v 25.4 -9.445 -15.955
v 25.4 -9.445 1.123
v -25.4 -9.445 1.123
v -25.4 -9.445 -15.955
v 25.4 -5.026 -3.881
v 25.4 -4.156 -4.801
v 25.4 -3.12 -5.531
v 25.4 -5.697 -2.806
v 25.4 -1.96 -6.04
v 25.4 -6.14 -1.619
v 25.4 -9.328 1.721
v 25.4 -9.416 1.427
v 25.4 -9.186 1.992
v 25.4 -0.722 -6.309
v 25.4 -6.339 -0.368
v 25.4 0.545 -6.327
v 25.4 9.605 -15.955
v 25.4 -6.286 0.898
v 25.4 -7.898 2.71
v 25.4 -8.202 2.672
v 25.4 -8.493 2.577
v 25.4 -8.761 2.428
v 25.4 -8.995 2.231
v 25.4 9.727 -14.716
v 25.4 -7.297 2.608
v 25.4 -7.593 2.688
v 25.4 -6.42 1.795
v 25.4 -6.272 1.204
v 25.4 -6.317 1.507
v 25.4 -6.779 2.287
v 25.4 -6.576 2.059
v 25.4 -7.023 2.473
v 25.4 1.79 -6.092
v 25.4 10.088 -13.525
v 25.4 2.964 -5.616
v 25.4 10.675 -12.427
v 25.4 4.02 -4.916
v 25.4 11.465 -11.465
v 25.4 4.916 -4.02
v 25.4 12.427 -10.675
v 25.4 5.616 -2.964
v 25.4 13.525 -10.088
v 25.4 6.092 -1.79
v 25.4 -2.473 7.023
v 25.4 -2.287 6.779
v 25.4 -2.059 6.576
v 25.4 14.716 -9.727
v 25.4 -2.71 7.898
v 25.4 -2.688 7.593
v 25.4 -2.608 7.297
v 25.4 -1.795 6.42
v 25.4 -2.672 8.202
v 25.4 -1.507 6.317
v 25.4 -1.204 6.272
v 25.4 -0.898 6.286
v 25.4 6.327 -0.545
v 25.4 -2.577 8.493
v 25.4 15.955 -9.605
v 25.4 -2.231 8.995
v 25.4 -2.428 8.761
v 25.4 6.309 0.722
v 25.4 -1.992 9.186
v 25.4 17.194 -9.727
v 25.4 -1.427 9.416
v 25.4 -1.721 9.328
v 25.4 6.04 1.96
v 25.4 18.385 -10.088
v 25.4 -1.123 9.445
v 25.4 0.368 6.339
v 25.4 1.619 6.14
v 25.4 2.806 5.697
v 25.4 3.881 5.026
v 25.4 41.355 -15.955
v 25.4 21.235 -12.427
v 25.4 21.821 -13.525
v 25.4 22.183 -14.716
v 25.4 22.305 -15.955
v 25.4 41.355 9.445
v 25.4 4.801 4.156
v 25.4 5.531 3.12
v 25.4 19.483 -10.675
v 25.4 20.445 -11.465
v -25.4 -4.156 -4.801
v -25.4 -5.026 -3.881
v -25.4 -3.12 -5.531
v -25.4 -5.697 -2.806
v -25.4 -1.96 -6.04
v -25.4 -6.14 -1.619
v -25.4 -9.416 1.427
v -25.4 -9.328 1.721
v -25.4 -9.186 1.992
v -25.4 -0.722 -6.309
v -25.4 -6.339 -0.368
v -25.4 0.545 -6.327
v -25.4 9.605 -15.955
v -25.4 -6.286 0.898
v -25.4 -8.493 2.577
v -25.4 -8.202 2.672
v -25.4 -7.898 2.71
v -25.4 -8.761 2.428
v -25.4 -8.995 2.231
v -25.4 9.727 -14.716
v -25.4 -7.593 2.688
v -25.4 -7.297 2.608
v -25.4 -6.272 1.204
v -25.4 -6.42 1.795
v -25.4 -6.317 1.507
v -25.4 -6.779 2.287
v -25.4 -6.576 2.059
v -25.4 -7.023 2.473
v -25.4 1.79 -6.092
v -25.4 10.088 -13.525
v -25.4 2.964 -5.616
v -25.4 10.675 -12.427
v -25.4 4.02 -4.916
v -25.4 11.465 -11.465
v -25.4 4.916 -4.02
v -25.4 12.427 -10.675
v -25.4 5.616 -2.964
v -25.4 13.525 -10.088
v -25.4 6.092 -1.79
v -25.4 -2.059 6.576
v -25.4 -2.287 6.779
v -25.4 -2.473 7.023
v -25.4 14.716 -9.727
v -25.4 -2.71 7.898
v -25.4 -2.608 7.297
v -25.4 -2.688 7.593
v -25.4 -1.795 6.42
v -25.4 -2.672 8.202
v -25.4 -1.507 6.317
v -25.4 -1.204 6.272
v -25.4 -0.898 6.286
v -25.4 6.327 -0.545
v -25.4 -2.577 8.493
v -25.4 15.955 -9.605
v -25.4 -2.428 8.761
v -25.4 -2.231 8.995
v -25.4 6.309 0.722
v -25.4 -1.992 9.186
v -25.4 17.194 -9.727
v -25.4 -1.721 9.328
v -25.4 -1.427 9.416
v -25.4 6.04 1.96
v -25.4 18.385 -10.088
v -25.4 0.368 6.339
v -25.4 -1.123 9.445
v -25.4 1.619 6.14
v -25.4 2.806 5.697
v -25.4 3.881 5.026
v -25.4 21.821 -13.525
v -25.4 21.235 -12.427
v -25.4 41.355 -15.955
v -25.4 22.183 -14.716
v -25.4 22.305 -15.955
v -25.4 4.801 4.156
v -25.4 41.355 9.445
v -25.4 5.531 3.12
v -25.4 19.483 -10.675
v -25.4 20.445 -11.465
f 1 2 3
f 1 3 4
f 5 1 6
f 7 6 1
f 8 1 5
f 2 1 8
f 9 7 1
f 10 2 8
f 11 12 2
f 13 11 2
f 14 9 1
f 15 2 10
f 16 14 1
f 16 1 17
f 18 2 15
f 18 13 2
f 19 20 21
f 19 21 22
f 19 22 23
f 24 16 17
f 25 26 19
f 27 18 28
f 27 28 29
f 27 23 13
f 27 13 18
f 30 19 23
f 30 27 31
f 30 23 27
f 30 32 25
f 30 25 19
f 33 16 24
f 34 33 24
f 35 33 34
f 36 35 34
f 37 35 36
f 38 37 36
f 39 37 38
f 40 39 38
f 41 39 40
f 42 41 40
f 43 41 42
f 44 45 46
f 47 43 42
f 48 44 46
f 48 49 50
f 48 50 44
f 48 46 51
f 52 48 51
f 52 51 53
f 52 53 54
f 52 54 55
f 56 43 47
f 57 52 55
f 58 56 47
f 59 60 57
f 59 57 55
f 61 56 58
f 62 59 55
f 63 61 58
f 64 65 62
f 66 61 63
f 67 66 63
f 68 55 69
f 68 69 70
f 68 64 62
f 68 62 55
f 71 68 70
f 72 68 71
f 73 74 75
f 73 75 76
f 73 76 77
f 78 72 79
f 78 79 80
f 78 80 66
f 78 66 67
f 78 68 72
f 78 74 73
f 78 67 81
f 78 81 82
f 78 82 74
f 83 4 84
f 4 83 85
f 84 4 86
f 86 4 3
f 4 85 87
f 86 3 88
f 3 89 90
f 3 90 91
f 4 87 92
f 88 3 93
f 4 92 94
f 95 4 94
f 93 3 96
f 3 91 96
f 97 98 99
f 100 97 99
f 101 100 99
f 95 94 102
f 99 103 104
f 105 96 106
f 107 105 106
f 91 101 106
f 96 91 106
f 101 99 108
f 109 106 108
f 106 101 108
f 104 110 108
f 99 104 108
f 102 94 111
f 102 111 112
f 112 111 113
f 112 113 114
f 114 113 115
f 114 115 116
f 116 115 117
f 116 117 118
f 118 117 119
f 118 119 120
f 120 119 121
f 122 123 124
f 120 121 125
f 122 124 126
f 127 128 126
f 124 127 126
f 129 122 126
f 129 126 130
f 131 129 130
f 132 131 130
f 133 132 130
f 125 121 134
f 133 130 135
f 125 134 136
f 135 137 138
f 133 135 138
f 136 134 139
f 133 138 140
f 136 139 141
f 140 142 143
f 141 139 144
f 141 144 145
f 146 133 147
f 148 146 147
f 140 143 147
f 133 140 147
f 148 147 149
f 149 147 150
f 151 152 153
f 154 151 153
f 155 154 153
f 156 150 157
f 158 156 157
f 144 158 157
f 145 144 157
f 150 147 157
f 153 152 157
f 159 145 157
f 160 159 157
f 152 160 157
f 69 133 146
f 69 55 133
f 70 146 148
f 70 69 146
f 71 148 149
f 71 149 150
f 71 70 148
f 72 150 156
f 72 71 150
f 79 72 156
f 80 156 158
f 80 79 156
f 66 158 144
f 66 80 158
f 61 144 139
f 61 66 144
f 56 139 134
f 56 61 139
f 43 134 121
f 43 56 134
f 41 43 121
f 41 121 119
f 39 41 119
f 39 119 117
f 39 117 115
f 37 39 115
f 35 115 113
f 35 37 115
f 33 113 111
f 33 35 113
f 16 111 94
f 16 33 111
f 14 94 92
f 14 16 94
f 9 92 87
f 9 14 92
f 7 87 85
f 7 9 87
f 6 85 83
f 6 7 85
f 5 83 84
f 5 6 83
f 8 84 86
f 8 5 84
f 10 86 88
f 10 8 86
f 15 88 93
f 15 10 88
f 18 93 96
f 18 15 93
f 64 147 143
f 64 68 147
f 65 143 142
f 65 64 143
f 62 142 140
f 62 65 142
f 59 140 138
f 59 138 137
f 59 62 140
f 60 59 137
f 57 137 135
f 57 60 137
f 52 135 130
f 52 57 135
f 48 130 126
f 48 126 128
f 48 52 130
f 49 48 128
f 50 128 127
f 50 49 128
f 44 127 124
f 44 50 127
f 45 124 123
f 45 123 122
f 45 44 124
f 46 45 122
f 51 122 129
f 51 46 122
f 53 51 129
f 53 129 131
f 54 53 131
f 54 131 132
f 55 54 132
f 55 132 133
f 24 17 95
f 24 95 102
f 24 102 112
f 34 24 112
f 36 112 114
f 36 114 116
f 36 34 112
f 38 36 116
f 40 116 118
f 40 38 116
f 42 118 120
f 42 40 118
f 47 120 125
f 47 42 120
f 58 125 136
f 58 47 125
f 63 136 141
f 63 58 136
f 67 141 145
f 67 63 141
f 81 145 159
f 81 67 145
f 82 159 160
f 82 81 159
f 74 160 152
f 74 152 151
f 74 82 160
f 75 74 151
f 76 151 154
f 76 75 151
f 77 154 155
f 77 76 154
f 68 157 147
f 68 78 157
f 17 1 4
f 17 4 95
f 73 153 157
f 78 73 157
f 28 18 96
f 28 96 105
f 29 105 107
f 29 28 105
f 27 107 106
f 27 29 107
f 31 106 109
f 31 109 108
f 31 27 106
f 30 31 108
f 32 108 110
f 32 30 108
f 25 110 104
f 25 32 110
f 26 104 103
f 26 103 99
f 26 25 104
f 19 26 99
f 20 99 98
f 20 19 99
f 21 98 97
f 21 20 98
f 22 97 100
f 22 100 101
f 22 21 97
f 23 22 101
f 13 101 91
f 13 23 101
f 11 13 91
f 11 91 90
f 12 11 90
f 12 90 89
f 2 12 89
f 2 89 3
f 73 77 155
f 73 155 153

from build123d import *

# Parameters (mm, degrees)
F1_DEPTH = 25.4


with BuildPart() as f1:
    # F0 (on Right) → F1 (new body, symmetric)
    with BuildSketch(Plane.YZ):
        with BuildLine():
            ThreePointArc((-0.898026, 6.286179), (4.490128, -4.490128), (-6.286179, 0.898026))
            ThreePointArc((-6.286179, 0.898026), (-7.745188, 2.706038), (-9.445224, 1.122532))
            Line((-9.445224, 1.122532), (-9.445224, -15.954776))
            Line((-9.445224, -15.954776), (9.604776, -15.954776))
            ThreePointArc((9.604776, -15.954776), (15.954776, -9.604776), (22.304776, -15.954776))
            Line((22.304776, -15.954776), (41.354776, -15.954776))
            Line((41.354776, -15.954776), (41.354776, 9.445224))
            Line((41.354776, 9.445224), (-1.122532, 9.445224))
            ThreePointArc((-1.122532, 9.445224), (-2.706038, 7.745188), (-0.898026, 6.286179))
        make_face()
    extrude(amount=F1_DEPTH, both=True)


solid = f1.part
